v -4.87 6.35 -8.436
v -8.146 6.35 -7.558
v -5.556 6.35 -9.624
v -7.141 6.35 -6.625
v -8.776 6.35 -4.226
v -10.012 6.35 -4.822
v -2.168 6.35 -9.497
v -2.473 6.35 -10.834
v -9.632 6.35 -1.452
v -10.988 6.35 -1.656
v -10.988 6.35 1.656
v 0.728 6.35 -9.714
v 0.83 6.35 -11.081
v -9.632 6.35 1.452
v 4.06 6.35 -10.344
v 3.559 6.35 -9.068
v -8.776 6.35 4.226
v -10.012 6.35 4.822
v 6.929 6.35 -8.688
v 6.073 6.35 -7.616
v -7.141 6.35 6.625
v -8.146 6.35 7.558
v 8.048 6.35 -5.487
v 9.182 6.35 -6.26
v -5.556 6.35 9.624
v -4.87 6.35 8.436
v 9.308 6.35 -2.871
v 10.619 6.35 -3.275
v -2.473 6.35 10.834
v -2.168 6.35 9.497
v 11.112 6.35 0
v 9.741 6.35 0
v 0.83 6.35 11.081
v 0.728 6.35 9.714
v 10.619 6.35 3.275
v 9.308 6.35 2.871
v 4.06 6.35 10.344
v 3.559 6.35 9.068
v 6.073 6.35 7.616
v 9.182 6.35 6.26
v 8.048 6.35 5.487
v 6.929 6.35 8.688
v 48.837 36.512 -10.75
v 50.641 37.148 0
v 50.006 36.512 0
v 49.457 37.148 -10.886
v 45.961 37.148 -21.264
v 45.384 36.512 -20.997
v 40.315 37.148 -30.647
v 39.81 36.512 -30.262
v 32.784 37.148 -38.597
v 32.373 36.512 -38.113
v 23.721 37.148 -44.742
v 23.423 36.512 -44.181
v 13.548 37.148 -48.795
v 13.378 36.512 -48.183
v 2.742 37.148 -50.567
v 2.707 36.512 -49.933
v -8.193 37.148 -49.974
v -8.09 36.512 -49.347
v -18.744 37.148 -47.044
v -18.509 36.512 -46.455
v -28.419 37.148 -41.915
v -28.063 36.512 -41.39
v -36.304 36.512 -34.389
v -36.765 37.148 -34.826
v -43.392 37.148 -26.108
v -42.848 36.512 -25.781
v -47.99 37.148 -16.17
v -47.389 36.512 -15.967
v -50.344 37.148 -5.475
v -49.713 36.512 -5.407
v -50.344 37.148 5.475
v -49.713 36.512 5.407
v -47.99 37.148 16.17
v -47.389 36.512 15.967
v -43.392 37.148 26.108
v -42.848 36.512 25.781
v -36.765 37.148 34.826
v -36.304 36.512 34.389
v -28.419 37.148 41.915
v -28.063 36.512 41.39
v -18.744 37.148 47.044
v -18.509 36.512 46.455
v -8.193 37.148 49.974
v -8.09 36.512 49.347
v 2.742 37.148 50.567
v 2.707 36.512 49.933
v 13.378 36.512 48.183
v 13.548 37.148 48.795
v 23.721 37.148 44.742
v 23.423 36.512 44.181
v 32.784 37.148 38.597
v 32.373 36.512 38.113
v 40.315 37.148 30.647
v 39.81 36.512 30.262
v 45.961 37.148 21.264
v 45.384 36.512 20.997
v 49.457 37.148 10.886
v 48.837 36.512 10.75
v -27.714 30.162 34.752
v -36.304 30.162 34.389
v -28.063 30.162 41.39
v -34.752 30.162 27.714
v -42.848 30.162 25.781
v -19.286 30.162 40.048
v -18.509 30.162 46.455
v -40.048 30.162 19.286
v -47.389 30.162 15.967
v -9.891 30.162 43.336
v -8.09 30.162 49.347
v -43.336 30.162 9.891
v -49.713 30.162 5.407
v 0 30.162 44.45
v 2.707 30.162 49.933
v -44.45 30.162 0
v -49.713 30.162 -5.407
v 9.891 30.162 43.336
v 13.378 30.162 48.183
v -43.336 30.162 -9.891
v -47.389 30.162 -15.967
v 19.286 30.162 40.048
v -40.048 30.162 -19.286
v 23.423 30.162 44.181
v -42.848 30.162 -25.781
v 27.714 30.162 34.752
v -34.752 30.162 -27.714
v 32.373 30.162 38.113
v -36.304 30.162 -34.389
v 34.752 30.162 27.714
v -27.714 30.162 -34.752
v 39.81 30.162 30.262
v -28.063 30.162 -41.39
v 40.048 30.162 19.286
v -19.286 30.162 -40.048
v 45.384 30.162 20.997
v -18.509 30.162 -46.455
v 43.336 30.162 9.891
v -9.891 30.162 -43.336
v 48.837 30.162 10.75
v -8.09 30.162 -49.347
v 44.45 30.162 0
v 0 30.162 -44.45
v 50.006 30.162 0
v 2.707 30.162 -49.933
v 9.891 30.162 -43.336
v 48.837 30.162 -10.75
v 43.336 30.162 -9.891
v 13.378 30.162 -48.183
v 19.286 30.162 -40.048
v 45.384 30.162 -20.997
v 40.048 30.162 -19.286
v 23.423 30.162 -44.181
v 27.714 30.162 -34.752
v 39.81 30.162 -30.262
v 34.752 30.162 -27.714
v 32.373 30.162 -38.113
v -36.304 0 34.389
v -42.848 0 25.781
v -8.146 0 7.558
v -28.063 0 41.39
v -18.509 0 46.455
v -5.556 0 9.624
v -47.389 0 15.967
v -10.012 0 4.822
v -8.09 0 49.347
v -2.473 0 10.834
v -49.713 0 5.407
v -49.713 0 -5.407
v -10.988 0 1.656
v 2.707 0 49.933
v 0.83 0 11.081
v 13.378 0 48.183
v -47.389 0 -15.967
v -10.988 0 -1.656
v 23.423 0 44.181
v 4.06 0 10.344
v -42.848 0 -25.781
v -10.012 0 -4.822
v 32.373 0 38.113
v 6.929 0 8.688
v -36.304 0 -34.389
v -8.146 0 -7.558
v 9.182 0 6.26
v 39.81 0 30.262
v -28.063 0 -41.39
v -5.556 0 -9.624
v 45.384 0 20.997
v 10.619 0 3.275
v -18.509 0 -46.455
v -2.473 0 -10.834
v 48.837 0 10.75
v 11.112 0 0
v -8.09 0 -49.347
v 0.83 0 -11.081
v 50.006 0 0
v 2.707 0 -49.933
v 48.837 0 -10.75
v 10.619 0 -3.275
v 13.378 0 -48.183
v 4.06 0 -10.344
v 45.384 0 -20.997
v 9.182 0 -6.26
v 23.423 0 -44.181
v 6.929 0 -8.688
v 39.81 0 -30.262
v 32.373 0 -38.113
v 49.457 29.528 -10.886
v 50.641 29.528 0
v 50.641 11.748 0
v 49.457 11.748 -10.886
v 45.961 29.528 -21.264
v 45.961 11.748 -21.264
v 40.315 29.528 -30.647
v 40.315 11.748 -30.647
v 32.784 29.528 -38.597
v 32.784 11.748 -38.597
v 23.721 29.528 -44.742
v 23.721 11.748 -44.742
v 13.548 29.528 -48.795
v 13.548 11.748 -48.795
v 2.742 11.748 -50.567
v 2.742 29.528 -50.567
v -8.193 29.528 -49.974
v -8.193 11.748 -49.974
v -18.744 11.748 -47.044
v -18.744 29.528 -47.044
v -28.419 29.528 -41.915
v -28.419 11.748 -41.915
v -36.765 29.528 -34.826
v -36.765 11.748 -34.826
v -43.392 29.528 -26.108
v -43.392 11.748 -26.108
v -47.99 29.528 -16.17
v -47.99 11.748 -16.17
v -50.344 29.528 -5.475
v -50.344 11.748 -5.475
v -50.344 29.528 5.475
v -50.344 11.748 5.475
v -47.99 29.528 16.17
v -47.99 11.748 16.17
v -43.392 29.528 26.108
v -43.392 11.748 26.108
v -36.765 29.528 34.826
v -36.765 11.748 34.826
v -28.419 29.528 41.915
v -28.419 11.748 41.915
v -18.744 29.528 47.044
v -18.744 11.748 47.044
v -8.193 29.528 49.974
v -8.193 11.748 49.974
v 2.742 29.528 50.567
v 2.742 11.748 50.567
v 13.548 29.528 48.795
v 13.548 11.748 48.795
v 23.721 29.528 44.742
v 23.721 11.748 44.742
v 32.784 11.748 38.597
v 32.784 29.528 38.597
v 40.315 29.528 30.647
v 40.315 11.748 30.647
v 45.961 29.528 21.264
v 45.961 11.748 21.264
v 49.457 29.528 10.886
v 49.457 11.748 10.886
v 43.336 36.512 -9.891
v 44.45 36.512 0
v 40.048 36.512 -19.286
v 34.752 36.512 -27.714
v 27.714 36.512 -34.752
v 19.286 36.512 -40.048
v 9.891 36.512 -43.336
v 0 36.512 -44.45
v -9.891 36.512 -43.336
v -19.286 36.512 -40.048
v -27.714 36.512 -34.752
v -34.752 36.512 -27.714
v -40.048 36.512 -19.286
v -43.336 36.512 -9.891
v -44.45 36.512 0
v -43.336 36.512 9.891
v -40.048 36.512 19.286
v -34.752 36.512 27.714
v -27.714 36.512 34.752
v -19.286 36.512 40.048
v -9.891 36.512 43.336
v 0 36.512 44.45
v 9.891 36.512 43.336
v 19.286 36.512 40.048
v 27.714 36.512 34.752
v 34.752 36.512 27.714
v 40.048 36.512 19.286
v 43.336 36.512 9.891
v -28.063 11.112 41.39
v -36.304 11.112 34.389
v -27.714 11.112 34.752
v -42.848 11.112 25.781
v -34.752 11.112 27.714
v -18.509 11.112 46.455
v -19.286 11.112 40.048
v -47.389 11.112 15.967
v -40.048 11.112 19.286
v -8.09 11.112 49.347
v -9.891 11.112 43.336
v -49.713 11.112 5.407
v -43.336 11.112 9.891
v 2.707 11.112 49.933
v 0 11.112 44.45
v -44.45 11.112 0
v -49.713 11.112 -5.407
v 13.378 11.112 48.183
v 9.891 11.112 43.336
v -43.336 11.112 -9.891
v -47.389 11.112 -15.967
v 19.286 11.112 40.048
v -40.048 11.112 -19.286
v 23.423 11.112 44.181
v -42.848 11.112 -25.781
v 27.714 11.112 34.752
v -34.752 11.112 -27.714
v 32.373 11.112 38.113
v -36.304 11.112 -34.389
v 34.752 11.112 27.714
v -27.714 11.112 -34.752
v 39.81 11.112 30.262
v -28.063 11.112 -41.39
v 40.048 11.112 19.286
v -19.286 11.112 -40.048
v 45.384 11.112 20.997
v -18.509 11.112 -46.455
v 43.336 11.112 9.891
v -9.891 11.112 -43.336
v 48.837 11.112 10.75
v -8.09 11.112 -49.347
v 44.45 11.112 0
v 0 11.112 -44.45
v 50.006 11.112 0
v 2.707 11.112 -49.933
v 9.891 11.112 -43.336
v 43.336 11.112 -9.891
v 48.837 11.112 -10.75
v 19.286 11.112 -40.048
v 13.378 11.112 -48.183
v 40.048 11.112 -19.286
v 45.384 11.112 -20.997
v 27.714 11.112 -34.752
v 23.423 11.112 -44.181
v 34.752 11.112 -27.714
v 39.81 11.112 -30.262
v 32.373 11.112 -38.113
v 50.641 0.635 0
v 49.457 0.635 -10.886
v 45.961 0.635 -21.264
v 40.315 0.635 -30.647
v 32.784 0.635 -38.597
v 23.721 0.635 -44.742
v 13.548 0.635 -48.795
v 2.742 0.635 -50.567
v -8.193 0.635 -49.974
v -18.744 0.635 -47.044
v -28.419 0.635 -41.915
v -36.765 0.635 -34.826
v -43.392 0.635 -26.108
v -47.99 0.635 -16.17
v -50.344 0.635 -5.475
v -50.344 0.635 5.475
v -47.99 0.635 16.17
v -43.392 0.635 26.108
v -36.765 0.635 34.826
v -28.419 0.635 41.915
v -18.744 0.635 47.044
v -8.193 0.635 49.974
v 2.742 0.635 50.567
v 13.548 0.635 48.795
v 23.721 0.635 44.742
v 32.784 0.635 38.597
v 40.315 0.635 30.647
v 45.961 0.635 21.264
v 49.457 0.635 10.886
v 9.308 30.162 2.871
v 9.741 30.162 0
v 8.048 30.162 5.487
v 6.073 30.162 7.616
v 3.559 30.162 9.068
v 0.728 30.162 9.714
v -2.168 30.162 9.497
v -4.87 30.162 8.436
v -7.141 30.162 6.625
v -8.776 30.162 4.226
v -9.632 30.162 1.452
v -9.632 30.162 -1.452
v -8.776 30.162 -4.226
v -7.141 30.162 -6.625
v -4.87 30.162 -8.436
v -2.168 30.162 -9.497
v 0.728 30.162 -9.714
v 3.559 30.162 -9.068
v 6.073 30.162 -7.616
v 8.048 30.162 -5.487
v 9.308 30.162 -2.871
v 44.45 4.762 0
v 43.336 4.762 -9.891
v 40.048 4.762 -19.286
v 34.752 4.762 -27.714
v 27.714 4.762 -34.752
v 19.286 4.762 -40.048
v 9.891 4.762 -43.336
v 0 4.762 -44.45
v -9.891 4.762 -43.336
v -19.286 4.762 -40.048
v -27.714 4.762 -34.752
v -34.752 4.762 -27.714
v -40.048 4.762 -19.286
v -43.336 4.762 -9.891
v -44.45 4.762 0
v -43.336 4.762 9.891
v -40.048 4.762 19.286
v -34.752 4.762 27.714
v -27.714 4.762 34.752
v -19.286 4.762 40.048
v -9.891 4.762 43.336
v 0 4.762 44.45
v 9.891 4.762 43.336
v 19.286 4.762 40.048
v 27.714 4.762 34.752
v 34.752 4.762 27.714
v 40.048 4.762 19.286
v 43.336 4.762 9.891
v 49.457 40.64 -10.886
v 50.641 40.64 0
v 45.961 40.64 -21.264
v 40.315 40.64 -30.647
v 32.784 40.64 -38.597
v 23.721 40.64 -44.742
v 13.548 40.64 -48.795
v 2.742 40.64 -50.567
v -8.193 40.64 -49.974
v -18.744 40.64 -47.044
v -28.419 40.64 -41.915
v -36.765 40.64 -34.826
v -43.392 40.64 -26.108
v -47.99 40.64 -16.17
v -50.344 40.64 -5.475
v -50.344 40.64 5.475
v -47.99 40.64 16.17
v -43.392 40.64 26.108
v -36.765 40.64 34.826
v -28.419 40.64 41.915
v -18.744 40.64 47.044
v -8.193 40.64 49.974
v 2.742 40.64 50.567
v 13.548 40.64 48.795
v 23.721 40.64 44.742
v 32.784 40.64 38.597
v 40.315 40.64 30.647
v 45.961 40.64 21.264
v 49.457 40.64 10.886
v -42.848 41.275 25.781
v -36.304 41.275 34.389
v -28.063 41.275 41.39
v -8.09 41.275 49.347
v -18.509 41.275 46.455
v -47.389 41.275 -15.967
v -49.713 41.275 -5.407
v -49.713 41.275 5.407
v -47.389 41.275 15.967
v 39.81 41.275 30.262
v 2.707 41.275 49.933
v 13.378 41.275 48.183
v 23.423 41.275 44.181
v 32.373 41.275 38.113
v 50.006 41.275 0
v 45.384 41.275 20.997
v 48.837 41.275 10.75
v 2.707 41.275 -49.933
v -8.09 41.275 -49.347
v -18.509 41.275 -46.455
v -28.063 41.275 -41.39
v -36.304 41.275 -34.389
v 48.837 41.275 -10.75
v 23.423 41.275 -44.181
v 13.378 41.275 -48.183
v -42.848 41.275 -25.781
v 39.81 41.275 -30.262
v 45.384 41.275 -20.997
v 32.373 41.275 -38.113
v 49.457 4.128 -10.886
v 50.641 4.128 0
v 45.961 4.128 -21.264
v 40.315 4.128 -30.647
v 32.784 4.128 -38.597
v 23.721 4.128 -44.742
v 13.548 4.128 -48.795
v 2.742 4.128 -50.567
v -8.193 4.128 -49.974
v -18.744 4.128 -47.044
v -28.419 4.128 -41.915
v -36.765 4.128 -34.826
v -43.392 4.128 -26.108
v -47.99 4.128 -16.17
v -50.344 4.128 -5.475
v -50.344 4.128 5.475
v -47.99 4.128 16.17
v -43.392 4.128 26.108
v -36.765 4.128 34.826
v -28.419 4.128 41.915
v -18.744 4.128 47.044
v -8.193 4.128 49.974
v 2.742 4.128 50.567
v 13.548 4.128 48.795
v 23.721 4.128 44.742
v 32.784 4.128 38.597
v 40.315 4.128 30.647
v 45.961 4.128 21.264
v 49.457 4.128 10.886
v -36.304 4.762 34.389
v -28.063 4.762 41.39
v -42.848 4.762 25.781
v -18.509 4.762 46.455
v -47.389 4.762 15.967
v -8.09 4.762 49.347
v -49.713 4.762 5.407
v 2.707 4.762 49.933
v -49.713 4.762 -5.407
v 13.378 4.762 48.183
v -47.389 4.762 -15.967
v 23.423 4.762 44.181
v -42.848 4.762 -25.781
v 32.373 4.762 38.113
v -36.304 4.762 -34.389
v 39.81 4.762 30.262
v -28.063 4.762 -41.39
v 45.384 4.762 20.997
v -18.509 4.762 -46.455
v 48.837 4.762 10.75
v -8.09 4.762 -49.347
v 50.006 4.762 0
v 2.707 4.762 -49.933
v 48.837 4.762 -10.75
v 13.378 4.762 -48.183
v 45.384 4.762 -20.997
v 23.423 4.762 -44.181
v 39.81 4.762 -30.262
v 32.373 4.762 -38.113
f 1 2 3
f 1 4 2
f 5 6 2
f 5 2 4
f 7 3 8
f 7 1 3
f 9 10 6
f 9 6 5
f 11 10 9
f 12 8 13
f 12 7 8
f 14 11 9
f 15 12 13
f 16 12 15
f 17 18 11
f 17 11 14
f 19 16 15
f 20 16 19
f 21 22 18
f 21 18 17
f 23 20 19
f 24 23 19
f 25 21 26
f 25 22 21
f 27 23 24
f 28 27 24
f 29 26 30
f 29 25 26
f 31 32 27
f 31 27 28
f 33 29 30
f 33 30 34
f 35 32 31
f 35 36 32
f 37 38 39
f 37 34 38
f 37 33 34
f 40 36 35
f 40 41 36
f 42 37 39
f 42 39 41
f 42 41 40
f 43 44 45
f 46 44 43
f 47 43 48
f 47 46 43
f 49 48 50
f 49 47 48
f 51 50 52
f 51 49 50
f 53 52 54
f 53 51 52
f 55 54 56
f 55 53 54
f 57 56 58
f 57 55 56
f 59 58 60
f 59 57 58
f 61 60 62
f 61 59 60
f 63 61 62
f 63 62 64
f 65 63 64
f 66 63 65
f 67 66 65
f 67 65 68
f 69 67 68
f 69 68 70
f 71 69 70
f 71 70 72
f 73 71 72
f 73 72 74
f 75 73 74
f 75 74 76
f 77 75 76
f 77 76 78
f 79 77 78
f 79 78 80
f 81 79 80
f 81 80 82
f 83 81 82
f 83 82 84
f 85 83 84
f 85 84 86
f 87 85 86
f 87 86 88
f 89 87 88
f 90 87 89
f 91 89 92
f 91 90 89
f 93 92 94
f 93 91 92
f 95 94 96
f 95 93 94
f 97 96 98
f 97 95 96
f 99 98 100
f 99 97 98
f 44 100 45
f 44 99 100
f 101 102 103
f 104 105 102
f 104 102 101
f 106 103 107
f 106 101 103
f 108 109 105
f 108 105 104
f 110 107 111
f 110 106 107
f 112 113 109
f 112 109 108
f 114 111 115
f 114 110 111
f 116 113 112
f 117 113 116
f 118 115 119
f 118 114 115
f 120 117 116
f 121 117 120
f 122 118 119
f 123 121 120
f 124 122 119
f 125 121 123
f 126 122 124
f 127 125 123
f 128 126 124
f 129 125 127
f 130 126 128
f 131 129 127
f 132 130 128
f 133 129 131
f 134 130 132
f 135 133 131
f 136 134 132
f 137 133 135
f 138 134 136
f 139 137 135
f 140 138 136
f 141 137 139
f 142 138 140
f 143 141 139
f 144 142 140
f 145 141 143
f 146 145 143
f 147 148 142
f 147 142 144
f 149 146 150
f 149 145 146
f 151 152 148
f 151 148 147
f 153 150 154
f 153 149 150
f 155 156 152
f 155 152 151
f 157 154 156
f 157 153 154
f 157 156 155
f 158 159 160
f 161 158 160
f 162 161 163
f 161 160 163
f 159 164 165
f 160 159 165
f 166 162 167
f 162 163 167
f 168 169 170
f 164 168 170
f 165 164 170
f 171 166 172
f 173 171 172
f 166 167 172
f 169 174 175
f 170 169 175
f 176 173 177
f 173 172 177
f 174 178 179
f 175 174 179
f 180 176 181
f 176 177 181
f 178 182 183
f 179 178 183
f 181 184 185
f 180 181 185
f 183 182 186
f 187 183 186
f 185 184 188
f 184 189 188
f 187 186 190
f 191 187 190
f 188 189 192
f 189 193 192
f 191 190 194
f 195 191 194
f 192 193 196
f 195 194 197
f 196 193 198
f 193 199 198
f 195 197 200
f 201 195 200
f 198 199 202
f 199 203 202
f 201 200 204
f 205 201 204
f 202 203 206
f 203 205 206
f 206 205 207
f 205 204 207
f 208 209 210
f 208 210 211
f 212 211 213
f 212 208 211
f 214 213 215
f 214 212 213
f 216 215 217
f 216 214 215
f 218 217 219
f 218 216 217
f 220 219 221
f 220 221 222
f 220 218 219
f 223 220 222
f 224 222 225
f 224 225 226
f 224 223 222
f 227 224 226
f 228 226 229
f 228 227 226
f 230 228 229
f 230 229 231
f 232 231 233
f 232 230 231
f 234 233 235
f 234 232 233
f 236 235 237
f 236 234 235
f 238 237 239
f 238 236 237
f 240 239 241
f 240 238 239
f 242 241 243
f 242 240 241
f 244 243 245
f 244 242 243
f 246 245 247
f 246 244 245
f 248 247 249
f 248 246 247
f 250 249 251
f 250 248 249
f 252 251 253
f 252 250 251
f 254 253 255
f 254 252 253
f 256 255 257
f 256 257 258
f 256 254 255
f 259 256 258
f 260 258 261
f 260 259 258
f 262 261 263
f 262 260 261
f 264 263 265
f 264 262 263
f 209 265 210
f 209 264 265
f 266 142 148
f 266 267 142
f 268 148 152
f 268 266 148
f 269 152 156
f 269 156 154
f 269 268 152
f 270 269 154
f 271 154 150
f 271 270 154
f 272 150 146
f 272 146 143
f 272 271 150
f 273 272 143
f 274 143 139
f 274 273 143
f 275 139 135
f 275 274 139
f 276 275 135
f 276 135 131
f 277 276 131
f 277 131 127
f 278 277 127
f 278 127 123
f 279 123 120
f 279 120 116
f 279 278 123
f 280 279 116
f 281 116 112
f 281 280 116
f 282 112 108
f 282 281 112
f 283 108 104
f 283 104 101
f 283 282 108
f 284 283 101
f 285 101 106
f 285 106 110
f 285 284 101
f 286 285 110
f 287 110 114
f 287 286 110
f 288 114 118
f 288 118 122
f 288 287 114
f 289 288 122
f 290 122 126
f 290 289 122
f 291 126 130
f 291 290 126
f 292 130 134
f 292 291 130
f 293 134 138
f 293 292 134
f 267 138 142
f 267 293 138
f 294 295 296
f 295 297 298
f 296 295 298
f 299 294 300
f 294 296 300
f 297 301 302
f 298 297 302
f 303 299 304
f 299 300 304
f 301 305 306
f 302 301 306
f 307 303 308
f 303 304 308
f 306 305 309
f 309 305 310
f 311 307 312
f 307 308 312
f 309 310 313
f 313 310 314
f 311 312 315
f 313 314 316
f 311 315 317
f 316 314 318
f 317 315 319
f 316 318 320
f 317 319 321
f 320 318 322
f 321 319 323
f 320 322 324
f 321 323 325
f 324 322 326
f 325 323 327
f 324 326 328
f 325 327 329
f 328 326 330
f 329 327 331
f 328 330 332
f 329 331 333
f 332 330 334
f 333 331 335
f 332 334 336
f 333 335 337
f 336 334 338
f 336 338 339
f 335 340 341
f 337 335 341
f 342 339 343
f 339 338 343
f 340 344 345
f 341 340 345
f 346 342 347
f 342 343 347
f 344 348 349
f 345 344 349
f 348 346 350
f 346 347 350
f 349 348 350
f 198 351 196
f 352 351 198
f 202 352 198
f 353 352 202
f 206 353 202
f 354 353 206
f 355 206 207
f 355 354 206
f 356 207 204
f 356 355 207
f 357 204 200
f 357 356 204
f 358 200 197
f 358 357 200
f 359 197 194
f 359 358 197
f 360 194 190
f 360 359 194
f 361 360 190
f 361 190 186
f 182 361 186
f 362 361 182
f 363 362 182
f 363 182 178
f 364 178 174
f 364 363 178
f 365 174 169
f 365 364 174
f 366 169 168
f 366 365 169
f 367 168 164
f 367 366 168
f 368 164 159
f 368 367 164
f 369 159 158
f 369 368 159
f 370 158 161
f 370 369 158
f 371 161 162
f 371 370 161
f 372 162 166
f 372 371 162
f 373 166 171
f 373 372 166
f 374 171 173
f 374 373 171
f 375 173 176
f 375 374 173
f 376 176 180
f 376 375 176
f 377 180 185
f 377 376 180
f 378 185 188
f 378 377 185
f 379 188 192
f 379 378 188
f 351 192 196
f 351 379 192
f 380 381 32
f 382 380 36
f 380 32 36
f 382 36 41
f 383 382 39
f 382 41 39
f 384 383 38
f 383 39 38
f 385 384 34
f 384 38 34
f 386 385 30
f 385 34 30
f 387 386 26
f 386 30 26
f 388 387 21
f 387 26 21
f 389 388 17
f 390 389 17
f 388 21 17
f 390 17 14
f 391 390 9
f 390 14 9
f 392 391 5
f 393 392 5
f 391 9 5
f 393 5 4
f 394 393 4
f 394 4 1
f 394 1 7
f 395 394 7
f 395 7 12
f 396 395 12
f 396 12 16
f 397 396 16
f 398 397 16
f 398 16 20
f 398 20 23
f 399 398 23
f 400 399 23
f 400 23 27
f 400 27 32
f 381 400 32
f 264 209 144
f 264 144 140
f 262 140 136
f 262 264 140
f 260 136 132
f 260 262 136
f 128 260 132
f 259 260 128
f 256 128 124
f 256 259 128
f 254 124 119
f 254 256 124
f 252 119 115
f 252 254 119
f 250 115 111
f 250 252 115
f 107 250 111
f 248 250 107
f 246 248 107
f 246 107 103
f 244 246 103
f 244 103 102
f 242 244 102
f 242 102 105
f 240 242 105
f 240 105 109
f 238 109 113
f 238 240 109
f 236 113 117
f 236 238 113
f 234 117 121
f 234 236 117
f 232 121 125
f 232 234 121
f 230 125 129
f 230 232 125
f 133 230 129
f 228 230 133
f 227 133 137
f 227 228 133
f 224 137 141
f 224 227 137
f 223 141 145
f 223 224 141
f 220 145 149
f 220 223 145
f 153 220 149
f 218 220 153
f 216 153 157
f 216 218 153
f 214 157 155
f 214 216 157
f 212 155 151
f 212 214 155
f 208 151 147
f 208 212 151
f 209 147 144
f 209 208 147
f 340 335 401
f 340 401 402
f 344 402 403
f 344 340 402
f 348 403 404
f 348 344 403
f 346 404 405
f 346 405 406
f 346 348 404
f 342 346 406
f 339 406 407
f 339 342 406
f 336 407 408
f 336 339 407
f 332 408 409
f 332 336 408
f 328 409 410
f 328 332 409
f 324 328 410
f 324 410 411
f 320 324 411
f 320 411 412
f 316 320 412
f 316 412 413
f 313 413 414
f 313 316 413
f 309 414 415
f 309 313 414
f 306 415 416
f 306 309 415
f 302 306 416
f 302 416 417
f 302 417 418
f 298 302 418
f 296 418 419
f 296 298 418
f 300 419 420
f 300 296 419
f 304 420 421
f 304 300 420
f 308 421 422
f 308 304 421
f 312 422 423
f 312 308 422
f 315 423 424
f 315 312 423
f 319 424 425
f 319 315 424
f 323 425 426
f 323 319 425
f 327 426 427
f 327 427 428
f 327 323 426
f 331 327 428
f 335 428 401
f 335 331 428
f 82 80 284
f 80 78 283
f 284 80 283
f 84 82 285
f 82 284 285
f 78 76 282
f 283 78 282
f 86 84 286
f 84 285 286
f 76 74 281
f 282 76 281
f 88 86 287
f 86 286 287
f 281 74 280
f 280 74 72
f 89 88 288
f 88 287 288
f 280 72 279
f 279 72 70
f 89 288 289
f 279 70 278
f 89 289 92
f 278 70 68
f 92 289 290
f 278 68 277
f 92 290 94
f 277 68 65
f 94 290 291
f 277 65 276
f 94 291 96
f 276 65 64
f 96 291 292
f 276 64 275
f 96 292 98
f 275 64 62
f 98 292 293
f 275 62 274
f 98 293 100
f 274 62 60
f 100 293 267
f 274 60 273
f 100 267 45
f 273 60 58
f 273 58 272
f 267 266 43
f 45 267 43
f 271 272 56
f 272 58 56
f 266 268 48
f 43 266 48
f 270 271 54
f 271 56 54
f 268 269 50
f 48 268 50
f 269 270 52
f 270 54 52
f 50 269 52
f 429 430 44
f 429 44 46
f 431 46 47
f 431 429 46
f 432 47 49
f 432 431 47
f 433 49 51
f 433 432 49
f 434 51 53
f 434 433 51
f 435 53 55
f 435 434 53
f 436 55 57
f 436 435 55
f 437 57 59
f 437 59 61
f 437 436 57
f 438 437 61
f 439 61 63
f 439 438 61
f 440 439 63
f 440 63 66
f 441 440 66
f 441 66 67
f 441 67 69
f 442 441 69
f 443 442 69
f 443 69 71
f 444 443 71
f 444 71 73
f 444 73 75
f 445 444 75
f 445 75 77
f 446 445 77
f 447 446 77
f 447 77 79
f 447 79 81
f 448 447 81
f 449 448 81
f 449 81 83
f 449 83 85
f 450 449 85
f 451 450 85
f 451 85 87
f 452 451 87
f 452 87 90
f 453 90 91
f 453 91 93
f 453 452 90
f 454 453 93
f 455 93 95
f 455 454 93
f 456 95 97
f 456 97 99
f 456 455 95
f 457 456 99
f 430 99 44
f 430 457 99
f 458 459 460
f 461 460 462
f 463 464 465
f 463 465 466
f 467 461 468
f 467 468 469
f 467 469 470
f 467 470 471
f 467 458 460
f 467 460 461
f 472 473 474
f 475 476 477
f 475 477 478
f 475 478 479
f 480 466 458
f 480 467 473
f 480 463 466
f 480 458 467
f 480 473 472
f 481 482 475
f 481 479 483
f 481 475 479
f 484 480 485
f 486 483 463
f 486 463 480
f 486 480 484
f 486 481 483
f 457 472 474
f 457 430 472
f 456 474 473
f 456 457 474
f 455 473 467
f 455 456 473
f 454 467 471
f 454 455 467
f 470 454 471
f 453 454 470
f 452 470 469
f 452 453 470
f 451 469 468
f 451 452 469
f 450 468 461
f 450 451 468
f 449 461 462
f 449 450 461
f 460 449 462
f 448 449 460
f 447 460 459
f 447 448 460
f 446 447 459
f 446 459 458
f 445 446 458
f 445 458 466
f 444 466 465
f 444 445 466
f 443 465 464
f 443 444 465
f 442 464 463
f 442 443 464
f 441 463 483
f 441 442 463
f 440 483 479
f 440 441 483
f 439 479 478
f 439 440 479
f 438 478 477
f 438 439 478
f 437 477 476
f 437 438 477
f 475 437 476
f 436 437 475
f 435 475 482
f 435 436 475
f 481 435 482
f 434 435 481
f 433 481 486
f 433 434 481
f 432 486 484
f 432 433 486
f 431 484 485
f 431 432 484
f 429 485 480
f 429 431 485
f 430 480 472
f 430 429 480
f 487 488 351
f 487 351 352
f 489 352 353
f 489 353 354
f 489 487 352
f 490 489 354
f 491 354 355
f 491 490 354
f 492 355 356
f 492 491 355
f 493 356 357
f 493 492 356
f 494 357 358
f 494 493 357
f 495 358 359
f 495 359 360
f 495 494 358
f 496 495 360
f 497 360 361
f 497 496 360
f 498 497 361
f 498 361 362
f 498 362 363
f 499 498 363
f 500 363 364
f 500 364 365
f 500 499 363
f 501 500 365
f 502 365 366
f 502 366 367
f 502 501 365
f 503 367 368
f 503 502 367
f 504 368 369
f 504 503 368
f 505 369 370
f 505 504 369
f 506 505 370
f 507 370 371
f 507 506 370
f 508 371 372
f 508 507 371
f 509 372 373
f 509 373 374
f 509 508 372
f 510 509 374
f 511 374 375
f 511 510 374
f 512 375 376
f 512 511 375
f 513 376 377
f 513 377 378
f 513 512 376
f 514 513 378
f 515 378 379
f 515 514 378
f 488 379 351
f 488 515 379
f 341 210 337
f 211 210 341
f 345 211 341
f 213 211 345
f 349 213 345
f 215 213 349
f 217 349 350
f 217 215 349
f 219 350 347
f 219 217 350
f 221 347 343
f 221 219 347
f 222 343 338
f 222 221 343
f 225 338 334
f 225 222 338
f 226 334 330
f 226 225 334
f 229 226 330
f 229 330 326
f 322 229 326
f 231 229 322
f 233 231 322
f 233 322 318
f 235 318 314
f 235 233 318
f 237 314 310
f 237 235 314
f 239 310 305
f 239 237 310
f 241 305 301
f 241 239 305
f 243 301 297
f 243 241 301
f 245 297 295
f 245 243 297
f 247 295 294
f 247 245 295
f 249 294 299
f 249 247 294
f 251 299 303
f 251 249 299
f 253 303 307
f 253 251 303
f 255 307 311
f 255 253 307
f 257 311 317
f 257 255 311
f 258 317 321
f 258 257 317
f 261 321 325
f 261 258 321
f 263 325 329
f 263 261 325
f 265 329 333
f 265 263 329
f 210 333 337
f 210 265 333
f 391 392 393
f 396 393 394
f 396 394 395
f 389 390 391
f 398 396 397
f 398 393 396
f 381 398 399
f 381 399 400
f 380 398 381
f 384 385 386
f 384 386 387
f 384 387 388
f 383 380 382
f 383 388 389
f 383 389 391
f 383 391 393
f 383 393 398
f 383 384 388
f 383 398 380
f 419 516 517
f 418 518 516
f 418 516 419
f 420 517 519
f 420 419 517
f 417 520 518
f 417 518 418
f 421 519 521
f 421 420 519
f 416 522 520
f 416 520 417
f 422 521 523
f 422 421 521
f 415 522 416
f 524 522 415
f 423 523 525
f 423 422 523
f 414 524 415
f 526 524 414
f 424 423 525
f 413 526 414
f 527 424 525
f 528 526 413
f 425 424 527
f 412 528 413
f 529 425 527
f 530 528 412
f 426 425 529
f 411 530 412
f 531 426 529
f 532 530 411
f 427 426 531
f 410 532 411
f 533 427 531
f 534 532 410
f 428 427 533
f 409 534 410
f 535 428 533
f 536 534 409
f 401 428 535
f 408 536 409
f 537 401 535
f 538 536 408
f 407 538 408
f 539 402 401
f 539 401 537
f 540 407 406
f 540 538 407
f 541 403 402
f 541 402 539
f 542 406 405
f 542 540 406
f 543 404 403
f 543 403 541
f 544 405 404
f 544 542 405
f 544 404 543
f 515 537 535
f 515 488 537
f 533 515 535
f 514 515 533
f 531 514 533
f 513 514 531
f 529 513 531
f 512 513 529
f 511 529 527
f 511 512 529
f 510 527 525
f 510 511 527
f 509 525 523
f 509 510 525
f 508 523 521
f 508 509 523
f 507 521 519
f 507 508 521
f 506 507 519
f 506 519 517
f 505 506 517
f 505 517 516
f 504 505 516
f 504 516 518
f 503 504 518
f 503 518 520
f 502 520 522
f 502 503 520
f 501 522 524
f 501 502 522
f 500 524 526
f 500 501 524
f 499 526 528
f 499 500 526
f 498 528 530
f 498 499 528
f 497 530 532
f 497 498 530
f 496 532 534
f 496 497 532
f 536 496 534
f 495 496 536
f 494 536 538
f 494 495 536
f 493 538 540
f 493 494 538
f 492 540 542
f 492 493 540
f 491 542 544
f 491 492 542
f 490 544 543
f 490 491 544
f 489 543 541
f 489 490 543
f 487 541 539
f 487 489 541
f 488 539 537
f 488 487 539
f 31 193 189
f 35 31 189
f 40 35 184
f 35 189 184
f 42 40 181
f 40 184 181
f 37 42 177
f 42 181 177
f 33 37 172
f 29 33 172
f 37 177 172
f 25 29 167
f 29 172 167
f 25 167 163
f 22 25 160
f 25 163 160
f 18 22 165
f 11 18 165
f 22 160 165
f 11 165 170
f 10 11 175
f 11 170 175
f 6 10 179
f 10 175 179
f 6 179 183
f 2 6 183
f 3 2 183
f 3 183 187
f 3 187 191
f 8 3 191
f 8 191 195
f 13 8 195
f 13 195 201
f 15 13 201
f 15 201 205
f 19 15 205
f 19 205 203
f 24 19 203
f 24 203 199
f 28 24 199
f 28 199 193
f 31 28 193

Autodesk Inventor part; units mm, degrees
ref_plane "YZ Plane" through (0, 0, 0) normal (1, 0, 0) x (0, 1, 0)
ref_plane "XZ Plane" through (0, 0, 0) normal (0, 1, 0) x (-1, 0, 0)
ref_plane "XY Plane" through (0, 0, 0) normal (0, 0, 1) x (1, 0, 0)
sketch "Sketch1" plane through (0, 0, 0) normal (0, 0, 1) x (1, 0, 0)
  line L0 (50.8, 0) -> (50.8, 39.0312) construction
  line L1 (0, 0) -> (50.6412, 0)
  line L2 (44.45, 0) -> (44.45, 51.6727)
  line L3 (0, 0) -> (0, 50.5742)
  line L4 (50.6412, 0) -> (50.6412, 45.6895)
  line L5 (50.6412, 4.7625) -> (44.45, 4.7625)
  line L6 (44.45, 11.1125) -> (50.6412, 11.1125)
  line L7 (50.6412, 30.1625) -> (44.45, 30.1625)
  line L8 (44.45, 36.5125) -> (50.6412, 36.5125)
  line L9 (50.6412, 41.275) -> (0, 41.275)
  point P0 (47.5456, 36.5125)
  point P1 (44.45, 30.1625)
  dimension "d1" = 50.6412
  dimension "d2" = 44.45
  dimension "d3" = 6.35
  dimension "d4" = 6.35
  dimension "d5" = 4.7625
  dimension "d6" = 19.05
  dimension "d7" = 4.7625
  dimension "d12" = 41.275
revolve "Revolution1" add sketch "Sketch1" angle 360 about axis through (0, 0, 0) along (0, 1, 0) contours L3 L9 L2 L1 | L2 L5 L4 L1 | L9 L4 L8 L2 | L2 L7 L4 L6
chamfer "Chamfer1" distance 0.635 angle 45 6 edges at (-50.6412, 0, 0) (-50.6412, 4.7625, 0) (-50.6412, 11.1125, 0) (-50.6412, 30.1625, 0) (-50.6412, 36.5125, 0) (-50.6412, 41.275, 0)
sketch "Sketch2" plane through (0, 0, 0) normal (0, -1, 0) x (1, 0, 0)
  circle A0 centre (0, 0) radius 9.7409
  circle A1 centre (0, 0) radius 11.1125
  dimension "d16" = 19.4818
  dimension "d17" = 22.225
extrude "Extrusion1" cut sketch "Sketch2" against normal up to surface (30.1625 mm away) contours A0
extrude "Extrusion2" cut sketch "Sketch2" against normal blind 6.35 contours A0 | A1
equation "\"MachineMaxHeight\" = 539.75"
equation "\"MachineMaxWidth\" = 215.9"
equation "\"MachineMaxLength\" = 266.7"
equation "\"MachineFluidCapacity\" = 25.4"
equation "\"MaxCompressiveCapacity\" = 20320"
equation "\"WashChamberID\" = 101.6"
equation "\"WashChamberOD\" = 114.3"
equation "\"ConduitThickness\" = 152.4"
equation "\"SealedSurfaceOffset\" = 0.15875"
equation "\"StaticORingThickness\" = 4.7625"
properties part number "2 Piston"
